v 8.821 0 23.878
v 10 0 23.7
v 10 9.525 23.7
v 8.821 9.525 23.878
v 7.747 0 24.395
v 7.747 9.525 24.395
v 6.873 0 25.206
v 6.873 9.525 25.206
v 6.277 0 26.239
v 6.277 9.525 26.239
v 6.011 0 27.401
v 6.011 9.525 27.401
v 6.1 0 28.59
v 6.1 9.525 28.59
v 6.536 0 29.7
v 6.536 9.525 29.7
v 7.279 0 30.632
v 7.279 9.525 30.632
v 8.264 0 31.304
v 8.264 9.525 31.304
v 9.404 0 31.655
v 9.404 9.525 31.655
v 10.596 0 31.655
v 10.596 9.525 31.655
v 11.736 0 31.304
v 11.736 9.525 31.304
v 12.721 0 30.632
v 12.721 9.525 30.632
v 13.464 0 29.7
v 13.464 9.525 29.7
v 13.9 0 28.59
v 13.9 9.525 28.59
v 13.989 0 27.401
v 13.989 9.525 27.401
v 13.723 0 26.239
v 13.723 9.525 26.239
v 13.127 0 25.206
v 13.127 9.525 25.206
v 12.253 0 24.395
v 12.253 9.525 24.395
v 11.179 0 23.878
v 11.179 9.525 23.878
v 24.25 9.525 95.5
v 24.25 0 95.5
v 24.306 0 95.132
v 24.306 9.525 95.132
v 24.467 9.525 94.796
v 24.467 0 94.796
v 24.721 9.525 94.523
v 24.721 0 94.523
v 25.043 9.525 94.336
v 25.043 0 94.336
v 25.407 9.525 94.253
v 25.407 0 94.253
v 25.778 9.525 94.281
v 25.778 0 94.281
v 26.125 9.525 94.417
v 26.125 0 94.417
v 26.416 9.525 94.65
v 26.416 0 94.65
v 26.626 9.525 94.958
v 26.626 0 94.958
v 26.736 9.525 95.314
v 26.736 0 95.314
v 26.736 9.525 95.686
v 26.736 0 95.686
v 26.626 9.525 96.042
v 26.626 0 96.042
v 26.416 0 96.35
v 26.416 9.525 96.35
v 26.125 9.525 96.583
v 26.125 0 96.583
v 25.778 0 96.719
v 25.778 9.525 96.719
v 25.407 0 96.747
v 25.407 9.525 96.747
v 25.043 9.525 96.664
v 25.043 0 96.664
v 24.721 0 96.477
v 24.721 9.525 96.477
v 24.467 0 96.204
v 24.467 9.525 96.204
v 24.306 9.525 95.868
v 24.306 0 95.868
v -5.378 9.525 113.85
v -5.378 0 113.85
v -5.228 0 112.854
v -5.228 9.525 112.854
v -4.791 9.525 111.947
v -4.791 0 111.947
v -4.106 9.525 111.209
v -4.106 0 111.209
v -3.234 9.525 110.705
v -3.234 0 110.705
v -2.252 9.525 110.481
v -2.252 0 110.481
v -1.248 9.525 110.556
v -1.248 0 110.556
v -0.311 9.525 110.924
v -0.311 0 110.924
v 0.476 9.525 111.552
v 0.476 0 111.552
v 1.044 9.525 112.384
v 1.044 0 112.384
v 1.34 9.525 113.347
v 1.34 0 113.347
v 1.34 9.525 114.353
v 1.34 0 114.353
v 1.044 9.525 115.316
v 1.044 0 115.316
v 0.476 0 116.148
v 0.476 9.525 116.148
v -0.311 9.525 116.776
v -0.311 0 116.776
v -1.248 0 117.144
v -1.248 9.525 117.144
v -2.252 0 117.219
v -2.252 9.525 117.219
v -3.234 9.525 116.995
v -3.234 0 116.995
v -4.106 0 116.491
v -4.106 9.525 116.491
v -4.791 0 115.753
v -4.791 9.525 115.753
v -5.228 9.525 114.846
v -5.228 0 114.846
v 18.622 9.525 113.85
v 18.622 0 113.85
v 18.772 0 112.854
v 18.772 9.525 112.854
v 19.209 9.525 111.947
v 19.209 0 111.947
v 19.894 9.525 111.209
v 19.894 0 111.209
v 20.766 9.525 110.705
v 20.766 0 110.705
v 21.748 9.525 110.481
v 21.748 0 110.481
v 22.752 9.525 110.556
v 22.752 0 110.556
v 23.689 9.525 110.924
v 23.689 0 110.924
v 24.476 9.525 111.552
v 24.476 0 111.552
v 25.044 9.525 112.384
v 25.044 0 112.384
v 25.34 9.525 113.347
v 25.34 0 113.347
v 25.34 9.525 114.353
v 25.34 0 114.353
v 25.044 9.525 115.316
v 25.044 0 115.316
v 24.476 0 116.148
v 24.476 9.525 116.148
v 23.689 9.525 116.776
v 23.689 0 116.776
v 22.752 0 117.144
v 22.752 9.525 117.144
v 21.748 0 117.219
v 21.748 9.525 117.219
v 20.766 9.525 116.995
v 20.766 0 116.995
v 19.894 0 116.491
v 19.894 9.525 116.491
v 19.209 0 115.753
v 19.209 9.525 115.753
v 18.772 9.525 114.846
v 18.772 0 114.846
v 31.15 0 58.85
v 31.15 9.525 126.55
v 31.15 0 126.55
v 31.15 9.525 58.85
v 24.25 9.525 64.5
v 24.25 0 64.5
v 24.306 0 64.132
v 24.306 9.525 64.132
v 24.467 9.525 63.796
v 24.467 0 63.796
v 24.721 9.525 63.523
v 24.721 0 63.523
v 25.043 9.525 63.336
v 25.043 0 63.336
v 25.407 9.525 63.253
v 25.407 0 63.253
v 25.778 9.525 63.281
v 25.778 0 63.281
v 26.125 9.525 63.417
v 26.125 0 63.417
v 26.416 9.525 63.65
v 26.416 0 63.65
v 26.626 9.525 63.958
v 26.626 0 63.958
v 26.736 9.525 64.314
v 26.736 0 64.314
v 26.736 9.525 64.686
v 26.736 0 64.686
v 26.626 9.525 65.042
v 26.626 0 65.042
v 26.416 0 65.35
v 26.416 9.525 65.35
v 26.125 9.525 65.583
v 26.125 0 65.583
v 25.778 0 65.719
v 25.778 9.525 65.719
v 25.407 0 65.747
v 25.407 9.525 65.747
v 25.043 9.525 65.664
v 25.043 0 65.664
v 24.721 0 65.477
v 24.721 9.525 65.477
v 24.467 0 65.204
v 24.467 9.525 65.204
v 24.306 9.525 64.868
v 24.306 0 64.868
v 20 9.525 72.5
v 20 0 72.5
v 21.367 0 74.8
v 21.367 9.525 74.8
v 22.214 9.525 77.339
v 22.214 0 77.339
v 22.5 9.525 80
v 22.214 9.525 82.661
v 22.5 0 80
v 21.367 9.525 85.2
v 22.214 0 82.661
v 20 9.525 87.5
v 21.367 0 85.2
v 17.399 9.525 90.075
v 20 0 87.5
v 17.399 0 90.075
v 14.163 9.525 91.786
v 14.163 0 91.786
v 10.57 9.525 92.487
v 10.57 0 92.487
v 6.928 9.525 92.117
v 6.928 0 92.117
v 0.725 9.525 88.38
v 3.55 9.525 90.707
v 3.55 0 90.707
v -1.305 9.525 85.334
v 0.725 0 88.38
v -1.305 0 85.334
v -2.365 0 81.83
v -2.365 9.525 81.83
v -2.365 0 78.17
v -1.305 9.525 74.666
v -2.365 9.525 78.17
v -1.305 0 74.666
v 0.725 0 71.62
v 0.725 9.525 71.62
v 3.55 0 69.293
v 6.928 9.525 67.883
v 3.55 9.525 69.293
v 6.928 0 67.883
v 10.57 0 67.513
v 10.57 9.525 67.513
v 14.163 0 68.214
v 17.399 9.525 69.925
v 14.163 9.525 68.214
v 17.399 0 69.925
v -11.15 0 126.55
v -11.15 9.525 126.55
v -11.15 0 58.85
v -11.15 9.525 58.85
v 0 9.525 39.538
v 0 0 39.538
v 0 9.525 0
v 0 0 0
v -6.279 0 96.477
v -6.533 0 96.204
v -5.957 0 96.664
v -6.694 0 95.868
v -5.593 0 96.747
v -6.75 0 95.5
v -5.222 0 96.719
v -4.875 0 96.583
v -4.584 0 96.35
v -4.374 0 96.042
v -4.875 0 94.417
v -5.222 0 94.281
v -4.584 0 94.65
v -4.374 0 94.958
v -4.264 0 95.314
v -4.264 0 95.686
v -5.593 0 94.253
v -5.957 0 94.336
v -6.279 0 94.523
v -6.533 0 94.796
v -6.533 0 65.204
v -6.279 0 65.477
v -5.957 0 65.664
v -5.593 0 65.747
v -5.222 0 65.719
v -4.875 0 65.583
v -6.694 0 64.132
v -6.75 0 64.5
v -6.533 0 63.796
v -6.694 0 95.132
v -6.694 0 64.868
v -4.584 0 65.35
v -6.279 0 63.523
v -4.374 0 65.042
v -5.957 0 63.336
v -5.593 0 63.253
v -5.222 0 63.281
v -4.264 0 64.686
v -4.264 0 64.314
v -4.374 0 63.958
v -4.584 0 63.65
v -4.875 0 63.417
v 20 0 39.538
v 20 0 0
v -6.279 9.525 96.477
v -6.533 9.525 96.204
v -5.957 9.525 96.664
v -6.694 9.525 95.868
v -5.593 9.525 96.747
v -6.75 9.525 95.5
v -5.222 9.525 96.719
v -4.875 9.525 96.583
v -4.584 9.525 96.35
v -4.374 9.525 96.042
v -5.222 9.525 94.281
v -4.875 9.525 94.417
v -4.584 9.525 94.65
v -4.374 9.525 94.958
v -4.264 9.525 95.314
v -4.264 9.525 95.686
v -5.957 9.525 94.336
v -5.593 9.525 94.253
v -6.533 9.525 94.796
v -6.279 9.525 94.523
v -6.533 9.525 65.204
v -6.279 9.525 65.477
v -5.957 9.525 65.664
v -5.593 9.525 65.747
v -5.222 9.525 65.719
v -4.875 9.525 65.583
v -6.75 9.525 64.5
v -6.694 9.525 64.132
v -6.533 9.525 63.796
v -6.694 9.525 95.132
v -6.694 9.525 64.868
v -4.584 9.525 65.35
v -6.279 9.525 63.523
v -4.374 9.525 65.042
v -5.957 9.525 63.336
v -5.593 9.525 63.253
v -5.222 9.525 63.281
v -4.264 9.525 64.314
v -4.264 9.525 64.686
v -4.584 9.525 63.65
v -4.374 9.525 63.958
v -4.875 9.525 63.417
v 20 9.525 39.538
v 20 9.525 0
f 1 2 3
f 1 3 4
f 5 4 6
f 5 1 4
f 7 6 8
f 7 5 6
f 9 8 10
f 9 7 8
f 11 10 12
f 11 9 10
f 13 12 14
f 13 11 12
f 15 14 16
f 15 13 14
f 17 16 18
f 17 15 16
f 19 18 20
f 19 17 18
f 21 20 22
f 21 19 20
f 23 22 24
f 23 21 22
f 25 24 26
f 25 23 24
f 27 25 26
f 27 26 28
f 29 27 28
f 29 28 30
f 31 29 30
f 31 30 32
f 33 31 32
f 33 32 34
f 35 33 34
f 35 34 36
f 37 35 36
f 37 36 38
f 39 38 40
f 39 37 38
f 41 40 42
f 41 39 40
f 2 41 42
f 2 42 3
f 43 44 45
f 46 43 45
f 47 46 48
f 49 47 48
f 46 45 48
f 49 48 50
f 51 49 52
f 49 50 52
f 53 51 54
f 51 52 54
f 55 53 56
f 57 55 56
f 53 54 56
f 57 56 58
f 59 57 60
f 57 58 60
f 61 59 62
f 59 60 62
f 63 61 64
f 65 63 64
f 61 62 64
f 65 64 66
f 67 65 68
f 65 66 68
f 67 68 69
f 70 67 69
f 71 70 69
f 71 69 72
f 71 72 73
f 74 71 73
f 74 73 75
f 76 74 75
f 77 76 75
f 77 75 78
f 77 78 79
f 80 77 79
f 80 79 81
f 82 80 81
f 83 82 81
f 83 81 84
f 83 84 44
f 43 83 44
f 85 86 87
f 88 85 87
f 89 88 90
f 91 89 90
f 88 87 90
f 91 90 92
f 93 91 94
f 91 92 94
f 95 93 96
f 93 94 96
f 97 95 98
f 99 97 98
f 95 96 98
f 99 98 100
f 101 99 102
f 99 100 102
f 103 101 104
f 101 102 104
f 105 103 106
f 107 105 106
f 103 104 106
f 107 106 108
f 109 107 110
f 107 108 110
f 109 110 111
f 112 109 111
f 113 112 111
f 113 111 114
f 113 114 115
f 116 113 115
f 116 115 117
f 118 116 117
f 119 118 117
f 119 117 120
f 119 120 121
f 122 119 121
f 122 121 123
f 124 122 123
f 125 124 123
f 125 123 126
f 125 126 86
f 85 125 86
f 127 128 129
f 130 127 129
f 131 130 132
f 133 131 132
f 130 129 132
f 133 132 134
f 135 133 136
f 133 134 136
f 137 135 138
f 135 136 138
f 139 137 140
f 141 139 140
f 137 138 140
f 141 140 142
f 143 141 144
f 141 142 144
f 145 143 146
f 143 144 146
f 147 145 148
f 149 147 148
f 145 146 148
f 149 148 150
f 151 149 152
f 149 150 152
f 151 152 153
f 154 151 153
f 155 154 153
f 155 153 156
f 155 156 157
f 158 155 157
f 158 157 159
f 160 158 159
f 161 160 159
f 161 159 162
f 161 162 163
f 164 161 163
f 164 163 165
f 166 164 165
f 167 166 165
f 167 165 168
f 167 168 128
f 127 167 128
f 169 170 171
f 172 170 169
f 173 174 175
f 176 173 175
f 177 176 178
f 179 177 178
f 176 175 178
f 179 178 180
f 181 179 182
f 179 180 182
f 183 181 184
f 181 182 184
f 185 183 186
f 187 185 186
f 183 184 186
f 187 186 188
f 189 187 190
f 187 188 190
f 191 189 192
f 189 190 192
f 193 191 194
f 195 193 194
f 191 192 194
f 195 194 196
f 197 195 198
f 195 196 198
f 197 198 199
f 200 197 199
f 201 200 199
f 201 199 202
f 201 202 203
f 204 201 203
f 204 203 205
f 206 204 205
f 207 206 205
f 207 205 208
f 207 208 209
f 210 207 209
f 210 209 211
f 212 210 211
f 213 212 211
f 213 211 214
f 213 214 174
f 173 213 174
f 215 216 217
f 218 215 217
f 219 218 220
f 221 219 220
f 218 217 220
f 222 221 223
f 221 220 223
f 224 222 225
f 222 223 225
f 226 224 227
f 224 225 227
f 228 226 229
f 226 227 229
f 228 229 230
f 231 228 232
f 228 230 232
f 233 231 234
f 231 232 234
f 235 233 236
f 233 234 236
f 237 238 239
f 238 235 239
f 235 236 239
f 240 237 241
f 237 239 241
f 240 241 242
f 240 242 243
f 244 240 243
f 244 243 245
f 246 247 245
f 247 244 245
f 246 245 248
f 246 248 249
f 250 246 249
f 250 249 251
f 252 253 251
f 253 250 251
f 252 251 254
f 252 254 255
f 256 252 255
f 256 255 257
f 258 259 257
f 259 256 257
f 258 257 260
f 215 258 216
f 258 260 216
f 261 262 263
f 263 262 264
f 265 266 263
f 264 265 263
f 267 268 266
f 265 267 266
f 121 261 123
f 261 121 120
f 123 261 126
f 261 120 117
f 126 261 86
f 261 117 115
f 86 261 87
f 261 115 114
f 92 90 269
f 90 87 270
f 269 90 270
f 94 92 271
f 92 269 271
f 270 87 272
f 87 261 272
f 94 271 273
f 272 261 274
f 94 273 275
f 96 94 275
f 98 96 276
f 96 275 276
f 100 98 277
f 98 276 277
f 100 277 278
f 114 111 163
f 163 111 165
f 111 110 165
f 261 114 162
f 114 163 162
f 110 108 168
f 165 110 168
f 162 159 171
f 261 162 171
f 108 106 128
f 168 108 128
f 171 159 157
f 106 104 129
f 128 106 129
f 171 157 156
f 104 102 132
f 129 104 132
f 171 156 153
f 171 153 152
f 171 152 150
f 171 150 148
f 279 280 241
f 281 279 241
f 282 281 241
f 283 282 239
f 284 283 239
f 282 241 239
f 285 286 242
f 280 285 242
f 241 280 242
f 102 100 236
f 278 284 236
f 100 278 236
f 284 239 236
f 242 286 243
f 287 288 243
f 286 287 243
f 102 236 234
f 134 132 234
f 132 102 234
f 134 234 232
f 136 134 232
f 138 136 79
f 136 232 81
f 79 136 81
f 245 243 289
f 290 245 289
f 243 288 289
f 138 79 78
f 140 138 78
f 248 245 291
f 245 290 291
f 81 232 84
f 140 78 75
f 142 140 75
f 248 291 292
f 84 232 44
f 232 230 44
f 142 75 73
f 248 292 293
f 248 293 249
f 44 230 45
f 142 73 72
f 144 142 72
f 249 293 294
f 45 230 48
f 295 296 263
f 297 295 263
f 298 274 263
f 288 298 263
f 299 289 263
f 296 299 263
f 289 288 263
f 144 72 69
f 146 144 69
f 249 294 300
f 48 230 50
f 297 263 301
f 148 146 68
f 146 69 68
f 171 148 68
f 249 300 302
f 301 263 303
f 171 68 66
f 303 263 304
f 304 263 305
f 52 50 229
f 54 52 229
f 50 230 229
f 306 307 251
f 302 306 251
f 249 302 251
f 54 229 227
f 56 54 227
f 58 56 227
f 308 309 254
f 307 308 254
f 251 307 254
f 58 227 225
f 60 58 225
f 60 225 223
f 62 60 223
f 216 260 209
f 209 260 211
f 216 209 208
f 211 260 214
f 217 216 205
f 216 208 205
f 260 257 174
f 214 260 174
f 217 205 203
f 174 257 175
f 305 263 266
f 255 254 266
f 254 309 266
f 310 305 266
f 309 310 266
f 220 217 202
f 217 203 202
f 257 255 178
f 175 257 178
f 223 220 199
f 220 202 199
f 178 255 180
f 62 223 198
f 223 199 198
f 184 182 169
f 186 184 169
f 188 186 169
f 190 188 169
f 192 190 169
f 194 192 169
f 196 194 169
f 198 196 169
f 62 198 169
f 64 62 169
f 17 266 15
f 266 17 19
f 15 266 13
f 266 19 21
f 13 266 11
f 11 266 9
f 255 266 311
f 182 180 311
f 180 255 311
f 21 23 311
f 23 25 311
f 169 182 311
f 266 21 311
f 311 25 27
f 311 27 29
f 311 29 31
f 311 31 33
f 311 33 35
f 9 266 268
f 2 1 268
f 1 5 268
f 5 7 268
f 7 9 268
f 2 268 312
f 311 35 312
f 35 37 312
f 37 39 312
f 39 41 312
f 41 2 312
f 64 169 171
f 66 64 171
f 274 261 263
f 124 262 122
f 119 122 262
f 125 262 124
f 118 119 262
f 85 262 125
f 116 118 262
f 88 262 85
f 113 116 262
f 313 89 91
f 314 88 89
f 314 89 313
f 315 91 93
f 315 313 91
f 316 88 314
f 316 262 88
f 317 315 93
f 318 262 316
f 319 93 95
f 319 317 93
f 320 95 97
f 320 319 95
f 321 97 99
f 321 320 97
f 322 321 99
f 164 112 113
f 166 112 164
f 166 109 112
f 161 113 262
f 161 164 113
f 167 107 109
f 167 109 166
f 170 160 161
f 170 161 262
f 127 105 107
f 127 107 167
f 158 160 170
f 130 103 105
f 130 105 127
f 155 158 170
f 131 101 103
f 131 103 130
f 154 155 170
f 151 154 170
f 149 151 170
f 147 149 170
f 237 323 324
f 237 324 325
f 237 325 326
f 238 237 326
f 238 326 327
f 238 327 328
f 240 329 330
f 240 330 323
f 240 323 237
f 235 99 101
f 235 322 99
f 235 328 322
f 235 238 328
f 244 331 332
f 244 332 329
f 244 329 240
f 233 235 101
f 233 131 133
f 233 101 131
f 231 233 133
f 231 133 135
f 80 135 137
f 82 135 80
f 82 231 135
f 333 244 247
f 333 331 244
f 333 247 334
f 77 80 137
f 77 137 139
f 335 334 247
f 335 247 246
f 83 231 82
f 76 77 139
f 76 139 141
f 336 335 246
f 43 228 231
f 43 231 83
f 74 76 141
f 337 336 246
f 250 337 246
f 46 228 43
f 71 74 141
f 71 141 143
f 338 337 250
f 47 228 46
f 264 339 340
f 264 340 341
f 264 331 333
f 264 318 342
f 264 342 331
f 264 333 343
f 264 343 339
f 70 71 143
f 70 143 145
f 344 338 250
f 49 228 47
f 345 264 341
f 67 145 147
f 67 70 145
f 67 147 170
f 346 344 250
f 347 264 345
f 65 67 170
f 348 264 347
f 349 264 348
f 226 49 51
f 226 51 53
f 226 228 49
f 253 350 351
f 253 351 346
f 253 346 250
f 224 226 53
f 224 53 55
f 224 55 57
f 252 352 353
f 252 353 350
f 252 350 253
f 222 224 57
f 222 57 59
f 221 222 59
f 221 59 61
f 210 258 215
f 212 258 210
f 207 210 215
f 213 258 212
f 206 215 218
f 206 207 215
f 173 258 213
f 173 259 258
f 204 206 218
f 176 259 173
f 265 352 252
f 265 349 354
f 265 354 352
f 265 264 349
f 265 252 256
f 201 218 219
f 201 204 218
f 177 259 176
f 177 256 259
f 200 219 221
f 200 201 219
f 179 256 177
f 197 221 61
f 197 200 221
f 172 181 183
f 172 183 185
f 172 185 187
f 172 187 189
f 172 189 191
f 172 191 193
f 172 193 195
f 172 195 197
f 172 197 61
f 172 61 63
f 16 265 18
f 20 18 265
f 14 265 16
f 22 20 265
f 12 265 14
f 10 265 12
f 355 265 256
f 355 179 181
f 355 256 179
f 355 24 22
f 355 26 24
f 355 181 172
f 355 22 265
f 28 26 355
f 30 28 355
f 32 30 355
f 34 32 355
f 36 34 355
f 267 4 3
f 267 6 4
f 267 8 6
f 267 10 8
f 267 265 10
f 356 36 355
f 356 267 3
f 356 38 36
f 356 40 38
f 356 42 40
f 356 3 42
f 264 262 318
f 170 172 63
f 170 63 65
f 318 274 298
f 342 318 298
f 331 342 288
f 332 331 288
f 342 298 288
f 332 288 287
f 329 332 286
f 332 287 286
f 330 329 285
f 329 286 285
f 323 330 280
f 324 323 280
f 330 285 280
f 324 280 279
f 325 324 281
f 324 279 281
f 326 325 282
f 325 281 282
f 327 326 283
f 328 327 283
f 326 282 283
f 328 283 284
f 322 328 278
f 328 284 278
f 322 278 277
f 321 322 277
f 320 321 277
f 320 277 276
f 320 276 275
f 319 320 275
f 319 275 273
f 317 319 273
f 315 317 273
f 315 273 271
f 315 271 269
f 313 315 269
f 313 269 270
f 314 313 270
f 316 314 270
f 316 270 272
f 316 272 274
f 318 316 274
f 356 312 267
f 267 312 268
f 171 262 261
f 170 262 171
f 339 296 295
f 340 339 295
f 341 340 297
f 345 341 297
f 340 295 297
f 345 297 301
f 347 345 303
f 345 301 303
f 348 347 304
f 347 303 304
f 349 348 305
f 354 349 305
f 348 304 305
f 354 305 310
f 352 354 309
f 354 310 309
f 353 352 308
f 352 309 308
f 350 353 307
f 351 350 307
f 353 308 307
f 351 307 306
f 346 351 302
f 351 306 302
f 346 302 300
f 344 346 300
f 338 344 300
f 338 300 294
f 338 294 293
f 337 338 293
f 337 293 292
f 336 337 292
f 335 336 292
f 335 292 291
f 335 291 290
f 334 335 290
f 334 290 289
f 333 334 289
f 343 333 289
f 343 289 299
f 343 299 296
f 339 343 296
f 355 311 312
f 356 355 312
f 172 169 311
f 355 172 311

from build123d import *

# Parameters (mm, degrees)
SKETCH2_R                   = 4
BOSS_EXTRUDE1_DEPTH         = 9.525
TAP_DRILL_FOR_M3X0_5_TAP1_D = 2.5
SKETCH7_W                   = 42.3
SKETCH7_H                   = 25.4
BOSS_EXTRUDE2_DEPTH         = 9.525
F_1_4_CLEARANCE_HOLE1_D     = 6.7564


with BuildPart() as part:
    # Sketch2 → Boss-Extrude1 (new body)
    # profile 1 of 6: a face of its own
    with BuildSketch(Plane(origin=(0, 0, 0), x_dir=(1, 0, 0), z_dir=(0, 1, 0))):
        Polygon((20, 0), (0, 0), (0, -39.537633496), (0, -58.85), (20, -58.85), (20, -39.537633496), align=None)
        with Locations(Location((10, -27.7, 0), (0, 0, 90))):
            Circle(SKETCH2_R, mode=Mode.SUBTRACT)
    # profile 2 of 6: a face of its own
    with BuildSketch(Plane(origin=(0, 0, 0), x_dir=(1, 0, 0), z_dir=(0, 1, 0))):
        Polygon((0, -58.85), (0, -39.537633496), (-11.15, -58.85), align=None)
    # profile 3 of 6: a face of its own
    with BuildSketch(Plane(origin=(0, 0, 0), x_dir=(1, 0, 0), z_dir=(0, 1, 0))):
        Polygon((31.15, -58.85), (20, -39.537633496), (20, -58.85), align=None)
    # profile 4 of 6: a face of its own
    with BuildSketch(Plane(origin=(0, 0, 0), x_dir=(1, 0, 0), z_dir=(0, 1, 0))):
        with BuildLine():
            Line((0, -72.5), (0, -58.85))
            Line((0, -58.85), (-11.15, -58.85))
            Line((-11.15, -58.85), (-11.15, -101.15))
            Line((-11.15, -101.15), (31.15, -101.15))
            Line((31.15, -101.15), (31.15, -58.85))
            Line((31.15, -58.85), (20, -58.85))
            Line((20, -58.85), (20, -72.5))
            ThreePointArc((20, -72.5), (21.858541226, -76.047152925), (22.5, -80))
            ThreePointArc((22.5, -80), (21.858541226, -83.952847075), (20, -87.5))
            Line((20, -87.5), (20, -100))
            Line((20, -100), (0, -100))
            Line((0, -100), (0, -87.5))
            ThreePointArc((0, -87.5), (-2.5, -80), (0, -72.5))
        make_face()
    # profile 5 of 6: a face of its own
    with BuildSketch(Plane(origin=(0, 0, 0), x_dir=(1, 0, 0), z_dir=(0, 1, 0))):
        with BuildLine():
            Line((20, -58.85), (0, -58.85))
            Line((0, -58.85), (0, -72.5))
            ThreePointArc((0, -72.5), (10, -67.5), (20, -72.5))
            Line((20, -72.5), (20, -58.85))
        make_face()
    # profile 6 of 6: a face of its own
    with BuildSketch(Plane(origin=(0, 0, 0), x_dir=(1, 0, 0), z_dir=(0, 1, 0))):
        with BuildLine():
            ThreePointArc((20, -87.5), (10, -92.5), (0, -87.5))
            Line((0, -87.5), (0, -100))
            Line((0, -100), (20, -100))
            Line((20, -100), (20, -87.5))
        make_face()
    extrude(amount=BOSS_EXTRUDE1_DEPTH)

    # Tap Drill for M3x0.5 Tap1 (through all)
    with Locations(Plane(origin=(0, 9.525, 0), x_dir=(1, 0, 0), z_dir=(0, 1, 0))):
        with Locations((-5.5, -64.5), (25.5, -64.5), (25.5, -95.5), (-5.5, -95.5)):
            Hole(TAP_DRILL_FOR_M3X0_5_TAP1_D / 2)

    # Sketch7 → Boss-Extrude2 (add)
    with BuildSketch(Plane(origin=(0, 9.525, 0), x_dir=(1, 0, 0), z_dir=(0, 1, 0))):
        with Locations((10, -113.85)):
            Rectangle(SKETCH7_W, SKETCH7_H)
    extrude(amount=-BOSS_EXTRUDE2_DEPTH)

    # 1/4 Clearance Hole1 (through all)
    with Locations(Plane(origin=(0, 9.525, 0), x_dir=(1, 0, 0), z_dir=(0, 1, 0))):
        with Locations((-2, -113.85), (22, -113.85)):
            Hole(F_1_4_CLEARANCE_HOLE1_D / 2)


solid = part.part
